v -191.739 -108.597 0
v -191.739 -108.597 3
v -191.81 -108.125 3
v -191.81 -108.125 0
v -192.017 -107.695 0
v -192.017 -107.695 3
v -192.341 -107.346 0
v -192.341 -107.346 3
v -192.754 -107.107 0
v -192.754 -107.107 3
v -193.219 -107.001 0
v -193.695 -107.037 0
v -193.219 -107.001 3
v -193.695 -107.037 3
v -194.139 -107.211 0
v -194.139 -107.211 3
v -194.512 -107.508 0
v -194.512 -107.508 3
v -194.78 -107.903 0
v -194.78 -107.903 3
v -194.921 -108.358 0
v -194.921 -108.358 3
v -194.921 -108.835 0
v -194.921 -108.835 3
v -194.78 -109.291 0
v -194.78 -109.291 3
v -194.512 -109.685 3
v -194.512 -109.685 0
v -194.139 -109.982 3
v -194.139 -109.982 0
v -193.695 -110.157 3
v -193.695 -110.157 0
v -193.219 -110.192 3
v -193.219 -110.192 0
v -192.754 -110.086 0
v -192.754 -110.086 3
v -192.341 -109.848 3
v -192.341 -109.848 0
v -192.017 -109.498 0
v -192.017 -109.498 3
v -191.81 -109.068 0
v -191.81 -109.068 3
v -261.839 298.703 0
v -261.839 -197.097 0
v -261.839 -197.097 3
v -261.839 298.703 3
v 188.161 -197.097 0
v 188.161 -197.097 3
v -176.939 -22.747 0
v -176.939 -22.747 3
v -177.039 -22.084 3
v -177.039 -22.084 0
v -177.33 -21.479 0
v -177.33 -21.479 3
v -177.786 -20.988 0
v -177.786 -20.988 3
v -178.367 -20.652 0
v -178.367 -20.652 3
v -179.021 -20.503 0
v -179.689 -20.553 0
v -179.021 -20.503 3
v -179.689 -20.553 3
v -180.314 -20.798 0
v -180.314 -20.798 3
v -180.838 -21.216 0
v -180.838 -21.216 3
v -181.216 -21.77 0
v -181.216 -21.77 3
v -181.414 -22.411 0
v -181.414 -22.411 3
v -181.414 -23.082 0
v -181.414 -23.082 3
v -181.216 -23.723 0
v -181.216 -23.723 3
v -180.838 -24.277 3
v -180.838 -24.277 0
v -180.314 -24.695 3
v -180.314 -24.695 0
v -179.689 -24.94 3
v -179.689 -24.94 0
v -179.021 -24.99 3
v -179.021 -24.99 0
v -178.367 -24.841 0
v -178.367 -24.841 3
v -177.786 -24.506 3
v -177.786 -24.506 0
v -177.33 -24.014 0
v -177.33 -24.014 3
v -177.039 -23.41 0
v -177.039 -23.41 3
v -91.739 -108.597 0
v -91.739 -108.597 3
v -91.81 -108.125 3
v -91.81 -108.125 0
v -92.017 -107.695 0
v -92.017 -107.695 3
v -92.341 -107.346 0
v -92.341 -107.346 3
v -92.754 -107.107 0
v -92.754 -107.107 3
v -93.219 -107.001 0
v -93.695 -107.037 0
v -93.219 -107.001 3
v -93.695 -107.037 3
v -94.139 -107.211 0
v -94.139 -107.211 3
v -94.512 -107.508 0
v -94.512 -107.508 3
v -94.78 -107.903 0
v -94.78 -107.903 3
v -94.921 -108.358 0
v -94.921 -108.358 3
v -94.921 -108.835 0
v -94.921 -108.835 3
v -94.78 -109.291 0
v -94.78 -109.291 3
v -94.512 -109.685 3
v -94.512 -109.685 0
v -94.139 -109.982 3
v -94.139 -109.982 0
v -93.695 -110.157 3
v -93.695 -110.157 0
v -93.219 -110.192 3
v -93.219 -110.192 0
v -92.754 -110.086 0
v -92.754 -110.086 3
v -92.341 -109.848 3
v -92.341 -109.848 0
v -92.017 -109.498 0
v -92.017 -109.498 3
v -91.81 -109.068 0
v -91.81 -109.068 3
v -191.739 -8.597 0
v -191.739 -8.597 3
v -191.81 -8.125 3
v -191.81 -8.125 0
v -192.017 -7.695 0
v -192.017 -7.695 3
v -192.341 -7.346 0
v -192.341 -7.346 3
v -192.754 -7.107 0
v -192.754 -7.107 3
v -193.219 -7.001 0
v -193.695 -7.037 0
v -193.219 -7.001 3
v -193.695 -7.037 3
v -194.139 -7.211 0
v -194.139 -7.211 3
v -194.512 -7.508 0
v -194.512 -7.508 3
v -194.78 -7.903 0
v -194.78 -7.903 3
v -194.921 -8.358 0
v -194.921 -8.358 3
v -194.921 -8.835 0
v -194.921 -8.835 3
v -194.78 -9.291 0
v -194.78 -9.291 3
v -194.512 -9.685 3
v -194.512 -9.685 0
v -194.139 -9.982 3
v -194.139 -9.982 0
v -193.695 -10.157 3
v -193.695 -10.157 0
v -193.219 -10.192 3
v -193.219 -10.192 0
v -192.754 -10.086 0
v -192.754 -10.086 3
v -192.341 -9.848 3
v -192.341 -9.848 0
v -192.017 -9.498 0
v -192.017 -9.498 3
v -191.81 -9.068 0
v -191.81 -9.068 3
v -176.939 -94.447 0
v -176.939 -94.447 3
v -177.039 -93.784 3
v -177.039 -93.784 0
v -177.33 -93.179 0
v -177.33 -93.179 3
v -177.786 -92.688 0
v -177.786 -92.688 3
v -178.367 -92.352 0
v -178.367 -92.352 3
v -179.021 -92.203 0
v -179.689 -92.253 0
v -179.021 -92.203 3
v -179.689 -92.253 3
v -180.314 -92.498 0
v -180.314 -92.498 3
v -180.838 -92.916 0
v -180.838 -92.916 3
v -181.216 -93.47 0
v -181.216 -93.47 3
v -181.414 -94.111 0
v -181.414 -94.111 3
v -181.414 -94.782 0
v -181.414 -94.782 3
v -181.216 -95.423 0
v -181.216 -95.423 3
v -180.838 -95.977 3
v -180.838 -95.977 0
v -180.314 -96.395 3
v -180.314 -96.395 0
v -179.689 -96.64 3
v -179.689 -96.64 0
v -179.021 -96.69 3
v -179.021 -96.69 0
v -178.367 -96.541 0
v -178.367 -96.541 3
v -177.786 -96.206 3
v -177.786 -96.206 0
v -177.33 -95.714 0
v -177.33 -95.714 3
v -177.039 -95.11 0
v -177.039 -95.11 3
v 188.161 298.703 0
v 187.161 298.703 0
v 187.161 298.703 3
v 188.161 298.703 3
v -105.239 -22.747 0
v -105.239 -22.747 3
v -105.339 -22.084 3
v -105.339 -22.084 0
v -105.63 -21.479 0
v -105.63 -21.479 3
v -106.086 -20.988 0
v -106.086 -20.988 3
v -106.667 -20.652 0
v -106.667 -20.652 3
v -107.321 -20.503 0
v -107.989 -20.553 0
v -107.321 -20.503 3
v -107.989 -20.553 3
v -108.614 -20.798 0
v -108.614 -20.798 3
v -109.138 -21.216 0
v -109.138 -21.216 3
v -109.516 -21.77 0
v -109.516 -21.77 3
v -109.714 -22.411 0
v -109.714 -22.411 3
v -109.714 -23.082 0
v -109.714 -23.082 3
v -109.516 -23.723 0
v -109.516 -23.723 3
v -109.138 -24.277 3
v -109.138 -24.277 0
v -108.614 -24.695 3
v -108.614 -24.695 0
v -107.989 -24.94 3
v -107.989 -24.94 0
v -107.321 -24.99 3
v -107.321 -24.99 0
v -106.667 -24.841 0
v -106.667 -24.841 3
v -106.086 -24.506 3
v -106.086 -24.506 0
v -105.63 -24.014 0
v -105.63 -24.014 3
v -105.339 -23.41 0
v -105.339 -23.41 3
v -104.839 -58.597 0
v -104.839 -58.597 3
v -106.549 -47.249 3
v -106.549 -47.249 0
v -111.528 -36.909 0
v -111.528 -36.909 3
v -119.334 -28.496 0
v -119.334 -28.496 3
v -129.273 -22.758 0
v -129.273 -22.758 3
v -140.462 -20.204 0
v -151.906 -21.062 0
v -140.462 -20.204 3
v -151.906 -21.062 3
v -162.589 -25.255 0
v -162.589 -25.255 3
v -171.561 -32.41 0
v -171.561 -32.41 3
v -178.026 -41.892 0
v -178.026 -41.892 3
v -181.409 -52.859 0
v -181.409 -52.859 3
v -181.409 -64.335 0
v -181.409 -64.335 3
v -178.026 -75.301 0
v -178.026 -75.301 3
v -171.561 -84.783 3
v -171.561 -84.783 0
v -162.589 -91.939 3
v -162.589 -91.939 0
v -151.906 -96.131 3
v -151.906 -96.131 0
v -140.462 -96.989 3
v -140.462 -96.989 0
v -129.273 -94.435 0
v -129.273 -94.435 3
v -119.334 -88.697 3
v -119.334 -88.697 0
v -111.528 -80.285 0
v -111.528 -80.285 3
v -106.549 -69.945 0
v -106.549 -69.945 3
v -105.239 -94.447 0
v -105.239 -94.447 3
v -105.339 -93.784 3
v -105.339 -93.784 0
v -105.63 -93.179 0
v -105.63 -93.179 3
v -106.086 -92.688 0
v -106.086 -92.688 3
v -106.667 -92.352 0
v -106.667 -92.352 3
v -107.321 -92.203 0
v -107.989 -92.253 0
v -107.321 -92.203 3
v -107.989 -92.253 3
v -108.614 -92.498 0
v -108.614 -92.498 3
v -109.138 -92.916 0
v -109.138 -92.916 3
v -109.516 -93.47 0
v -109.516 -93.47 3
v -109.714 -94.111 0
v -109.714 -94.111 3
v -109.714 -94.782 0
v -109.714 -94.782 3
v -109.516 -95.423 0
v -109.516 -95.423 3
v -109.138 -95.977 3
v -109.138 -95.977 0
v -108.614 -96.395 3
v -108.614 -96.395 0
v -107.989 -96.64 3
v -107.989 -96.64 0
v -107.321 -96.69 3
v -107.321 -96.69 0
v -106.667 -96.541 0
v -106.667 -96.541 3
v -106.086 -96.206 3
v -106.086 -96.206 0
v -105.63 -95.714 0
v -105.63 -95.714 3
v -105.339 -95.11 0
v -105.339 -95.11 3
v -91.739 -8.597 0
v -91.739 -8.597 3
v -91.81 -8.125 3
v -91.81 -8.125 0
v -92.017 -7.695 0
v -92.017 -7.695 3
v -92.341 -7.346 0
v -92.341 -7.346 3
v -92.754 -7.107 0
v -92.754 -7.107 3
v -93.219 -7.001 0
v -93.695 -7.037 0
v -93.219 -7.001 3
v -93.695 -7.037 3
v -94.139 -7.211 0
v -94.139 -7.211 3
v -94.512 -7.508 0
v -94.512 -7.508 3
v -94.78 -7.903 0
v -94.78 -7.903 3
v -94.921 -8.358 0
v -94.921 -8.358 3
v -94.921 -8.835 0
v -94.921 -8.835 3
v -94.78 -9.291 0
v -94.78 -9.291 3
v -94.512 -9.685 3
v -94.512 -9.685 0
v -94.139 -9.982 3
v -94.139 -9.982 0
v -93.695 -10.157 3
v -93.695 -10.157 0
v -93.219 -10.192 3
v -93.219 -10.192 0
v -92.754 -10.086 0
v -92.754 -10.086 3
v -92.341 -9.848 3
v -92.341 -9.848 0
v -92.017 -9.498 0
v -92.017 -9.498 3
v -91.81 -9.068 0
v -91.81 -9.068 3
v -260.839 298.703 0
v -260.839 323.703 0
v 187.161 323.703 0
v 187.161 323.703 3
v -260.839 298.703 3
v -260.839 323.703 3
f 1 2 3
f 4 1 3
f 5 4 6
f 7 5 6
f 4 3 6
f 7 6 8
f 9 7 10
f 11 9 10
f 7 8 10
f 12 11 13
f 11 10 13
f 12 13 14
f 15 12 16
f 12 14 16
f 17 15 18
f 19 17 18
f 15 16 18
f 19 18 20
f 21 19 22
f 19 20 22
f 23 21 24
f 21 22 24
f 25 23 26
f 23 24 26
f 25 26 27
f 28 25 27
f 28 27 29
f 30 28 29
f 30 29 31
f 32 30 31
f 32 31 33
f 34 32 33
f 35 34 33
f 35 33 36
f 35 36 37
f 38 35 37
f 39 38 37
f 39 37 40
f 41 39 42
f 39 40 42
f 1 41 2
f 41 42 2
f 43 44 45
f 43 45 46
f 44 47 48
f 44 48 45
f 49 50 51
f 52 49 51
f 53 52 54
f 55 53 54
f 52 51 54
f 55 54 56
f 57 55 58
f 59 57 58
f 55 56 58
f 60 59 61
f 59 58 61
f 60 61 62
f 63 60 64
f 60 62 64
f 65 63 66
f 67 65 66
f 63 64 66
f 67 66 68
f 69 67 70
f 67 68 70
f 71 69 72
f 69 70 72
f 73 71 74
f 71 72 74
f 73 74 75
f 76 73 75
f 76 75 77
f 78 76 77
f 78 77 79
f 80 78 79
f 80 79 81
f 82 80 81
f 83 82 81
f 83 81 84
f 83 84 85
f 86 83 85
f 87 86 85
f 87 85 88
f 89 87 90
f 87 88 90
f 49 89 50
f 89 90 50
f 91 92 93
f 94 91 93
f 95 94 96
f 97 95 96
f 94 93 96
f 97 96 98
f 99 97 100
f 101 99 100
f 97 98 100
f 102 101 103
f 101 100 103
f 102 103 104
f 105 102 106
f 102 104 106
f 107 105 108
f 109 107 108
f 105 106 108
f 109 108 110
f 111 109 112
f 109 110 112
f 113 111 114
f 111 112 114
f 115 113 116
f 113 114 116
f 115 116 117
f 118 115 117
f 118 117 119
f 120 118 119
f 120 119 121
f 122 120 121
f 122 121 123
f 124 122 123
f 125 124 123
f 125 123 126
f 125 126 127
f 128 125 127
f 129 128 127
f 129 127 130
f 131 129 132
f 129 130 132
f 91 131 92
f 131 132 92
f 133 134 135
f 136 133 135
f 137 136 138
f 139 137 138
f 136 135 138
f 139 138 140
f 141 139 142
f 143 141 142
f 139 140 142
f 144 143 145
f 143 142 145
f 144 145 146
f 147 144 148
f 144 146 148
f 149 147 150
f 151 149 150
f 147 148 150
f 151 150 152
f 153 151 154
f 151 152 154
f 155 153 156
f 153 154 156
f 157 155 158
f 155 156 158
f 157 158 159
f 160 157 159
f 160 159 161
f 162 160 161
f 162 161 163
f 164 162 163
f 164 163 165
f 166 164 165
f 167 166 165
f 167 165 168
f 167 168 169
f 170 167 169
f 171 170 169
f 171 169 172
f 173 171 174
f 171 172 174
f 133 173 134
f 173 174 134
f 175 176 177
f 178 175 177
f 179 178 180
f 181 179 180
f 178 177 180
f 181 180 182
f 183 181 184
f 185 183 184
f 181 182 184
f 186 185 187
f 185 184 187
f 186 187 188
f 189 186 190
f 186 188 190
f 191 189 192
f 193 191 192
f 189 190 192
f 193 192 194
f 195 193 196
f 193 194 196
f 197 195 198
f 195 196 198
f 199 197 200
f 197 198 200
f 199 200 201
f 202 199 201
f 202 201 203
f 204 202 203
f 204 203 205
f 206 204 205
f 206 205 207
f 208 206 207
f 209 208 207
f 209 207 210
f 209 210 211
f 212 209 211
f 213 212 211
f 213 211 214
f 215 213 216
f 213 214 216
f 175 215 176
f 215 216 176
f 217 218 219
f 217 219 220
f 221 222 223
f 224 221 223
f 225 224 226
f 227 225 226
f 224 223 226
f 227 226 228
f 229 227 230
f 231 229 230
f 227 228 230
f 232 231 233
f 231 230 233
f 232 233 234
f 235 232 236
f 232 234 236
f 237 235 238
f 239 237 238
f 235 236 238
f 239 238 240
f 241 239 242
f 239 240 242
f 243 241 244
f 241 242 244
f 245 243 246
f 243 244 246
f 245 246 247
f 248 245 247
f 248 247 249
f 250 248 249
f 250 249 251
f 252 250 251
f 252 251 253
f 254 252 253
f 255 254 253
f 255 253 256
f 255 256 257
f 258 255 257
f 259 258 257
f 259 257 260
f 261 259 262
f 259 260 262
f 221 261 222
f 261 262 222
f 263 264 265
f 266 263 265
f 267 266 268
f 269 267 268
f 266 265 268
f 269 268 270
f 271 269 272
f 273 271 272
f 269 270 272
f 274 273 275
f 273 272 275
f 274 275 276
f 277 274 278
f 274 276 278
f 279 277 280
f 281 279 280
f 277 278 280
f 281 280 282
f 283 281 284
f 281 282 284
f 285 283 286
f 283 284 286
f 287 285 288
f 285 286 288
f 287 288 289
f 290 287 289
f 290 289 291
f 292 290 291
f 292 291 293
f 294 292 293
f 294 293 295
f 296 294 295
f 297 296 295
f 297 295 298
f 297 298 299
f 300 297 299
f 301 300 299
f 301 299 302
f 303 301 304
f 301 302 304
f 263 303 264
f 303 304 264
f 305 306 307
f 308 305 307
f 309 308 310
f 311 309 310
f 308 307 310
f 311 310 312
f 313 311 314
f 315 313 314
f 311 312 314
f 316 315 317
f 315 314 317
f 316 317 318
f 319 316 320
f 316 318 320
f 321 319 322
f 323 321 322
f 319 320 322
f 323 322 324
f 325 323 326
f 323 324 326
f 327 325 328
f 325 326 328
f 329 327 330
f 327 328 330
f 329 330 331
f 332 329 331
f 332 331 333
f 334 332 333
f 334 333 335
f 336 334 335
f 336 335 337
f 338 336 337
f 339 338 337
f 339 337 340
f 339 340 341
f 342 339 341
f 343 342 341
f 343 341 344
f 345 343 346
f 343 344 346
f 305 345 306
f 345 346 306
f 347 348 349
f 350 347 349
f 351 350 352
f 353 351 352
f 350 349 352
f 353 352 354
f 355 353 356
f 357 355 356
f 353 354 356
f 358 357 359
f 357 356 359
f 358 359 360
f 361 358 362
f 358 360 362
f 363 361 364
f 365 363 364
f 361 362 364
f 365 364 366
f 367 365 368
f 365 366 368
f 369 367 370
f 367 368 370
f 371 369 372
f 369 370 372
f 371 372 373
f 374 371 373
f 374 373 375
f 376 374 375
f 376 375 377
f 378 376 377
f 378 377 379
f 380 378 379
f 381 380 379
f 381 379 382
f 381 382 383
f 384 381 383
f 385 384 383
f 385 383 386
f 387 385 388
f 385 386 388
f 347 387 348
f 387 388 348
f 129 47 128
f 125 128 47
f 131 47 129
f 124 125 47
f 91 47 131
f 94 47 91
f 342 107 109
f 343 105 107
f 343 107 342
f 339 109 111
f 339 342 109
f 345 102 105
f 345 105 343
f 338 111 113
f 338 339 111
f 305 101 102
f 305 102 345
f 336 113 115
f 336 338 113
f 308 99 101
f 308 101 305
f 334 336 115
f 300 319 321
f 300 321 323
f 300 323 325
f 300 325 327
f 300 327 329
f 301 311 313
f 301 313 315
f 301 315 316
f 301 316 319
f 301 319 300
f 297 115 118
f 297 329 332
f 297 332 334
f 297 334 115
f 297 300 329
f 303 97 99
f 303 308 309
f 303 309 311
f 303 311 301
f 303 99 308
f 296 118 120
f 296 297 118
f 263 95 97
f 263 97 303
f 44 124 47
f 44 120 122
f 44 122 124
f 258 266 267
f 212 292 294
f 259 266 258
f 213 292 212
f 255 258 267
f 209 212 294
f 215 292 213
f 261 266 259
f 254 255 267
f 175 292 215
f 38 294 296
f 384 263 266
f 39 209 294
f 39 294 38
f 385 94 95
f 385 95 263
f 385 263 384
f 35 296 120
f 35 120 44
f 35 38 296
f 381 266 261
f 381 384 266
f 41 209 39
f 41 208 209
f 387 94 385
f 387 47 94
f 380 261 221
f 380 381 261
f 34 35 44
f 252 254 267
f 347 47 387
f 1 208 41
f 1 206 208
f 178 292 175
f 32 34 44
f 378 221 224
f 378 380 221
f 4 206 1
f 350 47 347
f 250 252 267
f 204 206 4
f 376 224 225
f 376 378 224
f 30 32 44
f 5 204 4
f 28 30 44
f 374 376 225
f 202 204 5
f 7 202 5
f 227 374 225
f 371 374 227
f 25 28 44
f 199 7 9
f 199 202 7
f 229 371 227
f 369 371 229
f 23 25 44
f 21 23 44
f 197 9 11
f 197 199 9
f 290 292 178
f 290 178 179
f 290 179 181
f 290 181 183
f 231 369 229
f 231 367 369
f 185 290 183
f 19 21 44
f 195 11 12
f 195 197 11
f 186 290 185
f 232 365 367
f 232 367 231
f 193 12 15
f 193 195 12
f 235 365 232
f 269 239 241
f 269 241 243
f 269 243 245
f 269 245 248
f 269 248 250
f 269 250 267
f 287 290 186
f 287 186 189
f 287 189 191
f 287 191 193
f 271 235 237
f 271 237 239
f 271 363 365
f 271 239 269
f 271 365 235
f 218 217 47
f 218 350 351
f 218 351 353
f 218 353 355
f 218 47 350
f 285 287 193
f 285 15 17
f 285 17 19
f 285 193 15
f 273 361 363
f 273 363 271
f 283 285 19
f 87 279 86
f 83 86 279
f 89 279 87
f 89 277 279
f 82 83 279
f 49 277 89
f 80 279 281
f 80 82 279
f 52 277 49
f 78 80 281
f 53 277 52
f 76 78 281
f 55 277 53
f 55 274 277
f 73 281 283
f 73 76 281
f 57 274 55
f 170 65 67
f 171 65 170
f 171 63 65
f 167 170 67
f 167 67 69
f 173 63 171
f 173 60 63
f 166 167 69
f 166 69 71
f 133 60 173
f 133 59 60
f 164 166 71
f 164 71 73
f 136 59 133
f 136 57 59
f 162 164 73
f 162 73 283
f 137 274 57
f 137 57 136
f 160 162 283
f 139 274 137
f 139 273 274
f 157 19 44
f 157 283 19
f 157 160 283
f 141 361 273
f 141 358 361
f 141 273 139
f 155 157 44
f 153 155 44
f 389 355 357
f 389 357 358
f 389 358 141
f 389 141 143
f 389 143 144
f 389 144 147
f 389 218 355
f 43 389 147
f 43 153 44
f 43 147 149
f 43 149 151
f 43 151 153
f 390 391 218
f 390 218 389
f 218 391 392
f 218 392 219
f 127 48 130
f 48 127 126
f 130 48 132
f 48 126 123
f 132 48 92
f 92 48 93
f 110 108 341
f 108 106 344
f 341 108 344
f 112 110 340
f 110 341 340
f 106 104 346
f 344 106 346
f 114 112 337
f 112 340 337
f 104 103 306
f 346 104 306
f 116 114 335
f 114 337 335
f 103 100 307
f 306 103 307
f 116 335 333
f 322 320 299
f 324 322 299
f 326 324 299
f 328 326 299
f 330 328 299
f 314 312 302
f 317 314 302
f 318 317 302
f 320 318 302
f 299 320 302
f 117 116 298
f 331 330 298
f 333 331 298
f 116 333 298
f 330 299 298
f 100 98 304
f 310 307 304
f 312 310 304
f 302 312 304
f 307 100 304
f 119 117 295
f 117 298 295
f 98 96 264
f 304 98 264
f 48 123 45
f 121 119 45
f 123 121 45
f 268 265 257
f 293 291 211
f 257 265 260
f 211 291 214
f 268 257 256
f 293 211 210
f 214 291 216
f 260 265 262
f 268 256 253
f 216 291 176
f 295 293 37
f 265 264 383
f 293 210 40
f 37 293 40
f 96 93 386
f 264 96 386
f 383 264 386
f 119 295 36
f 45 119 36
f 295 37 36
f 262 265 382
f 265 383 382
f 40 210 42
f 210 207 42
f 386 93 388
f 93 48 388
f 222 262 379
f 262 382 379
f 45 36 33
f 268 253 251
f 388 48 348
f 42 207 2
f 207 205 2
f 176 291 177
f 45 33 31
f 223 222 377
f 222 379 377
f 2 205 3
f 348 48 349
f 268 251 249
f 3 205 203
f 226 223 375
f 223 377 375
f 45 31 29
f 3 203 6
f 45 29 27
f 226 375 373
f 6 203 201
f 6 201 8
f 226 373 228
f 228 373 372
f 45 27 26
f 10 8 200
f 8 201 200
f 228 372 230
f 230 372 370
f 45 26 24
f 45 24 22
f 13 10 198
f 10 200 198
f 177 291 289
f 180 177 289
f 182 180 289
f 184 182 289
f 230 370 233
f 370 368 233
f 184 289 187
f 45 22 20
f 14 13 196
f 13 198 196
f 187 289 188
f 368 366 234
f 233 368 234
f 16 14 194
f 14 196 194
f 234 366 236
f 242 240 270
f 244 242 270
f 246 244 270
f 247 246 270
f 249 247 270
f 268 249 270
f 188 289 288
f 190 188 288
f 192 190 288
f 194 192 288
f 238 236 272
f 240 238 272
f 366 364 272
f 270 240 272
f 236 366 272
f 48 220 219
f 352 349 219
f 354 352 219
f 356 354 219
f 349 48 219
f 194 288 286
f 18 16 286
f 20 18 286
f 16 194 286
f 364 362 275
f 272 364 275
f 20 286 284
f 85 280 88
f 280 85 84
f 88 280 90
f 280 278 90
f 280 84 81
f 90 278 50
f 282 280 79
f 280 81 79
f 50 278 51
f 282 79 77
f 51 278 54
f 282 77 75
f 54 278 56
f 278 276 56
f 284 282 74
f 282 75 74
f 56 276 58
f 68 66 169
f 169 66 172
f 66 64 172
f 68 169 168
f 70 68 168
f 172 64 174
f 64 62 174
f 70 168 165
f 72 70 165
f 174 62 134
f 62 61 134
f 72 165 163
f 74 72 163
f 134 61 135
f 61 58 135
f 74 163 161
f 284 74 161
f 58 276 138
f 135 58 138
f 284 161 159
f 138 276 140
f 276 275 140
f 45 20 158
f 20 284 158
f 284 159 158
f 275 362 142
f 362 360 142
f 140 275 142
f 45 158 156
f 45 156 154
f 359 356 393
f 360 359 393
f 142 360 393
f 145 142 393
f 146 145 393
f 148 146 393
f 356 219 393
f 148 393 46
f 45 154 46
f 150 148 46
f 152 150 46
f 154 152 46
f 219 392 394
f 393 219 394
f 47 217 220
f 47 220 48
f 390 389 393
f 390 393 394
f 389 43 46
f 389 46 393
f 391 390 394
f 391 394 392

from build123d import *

# Parameters (mm, degrees)
SALIENTE_EXTRUIR1_DEPTH = 3
CROQUIS2_R              = 38.5
CROQUIS2_R_2            = 2.25
CROQUIS2_R_3            = 1.6
CORTAR_EXTRUIR1_DEPTH   = 3


with BuildPart() as part:
    # Croquis1 → Saliente-Extruir1 (new body)
    with BuildSketch(Plane.XY):
        Polygon((-261.838674033, 298.703267526), (-260.838674033, 298.703267526), (-260.838674033, 323.703267526), (187.161325967, 323.703267526), (187.161325967, 298.703267526), (188.161325967, 298.703267526), (188.161325967, -197.096732474), (-261.838674033, -197.096732474), align=None)
    extrude(amount=SALIENTE_EXTRUIR1_DEPTH)

    # Croquis2 → Cortar-Extruir1 (cut)
    with BuildSketch(Plane.XY.offset(3)):
        with Locations((-143.338674033, -58.596732474)):
            Circle(CROQUIS2_R)
        with Locations((-107.488674033, -22.746732474)):
            Circle(CROQUIS2_R_2)
        with Locations((-107.488674033, -94.446732474)):
            Circle(CROQUIS2_R_2)
        with Locations((-179.188674033, -94.446732474)):
            Circle(CROQUIS2_R_2)
        with Locations((-179.188674033, -22.746732474)):
            Circle(CROQUIS2_R_2)
        with Locations((-93.338674033, -8.596732474)):
            Circle(CROQUIS2_R_3)
        with Locations((-93.338674033, -108.596732474)):
            Circle(CROQUIS2_R_3)
        with Locations((-193.338674033, -108.596732474)):
            Circle(CROQUIS2_R_3)
        with Locations((-193.338674033, -8.596732474)):
            Circle(CROQUIS2_R_3)
    extrude(amount=-CORTAR_EXTRUIR1_DEPTH, mode=Mode.SUBTRACT)


solid = part.part
